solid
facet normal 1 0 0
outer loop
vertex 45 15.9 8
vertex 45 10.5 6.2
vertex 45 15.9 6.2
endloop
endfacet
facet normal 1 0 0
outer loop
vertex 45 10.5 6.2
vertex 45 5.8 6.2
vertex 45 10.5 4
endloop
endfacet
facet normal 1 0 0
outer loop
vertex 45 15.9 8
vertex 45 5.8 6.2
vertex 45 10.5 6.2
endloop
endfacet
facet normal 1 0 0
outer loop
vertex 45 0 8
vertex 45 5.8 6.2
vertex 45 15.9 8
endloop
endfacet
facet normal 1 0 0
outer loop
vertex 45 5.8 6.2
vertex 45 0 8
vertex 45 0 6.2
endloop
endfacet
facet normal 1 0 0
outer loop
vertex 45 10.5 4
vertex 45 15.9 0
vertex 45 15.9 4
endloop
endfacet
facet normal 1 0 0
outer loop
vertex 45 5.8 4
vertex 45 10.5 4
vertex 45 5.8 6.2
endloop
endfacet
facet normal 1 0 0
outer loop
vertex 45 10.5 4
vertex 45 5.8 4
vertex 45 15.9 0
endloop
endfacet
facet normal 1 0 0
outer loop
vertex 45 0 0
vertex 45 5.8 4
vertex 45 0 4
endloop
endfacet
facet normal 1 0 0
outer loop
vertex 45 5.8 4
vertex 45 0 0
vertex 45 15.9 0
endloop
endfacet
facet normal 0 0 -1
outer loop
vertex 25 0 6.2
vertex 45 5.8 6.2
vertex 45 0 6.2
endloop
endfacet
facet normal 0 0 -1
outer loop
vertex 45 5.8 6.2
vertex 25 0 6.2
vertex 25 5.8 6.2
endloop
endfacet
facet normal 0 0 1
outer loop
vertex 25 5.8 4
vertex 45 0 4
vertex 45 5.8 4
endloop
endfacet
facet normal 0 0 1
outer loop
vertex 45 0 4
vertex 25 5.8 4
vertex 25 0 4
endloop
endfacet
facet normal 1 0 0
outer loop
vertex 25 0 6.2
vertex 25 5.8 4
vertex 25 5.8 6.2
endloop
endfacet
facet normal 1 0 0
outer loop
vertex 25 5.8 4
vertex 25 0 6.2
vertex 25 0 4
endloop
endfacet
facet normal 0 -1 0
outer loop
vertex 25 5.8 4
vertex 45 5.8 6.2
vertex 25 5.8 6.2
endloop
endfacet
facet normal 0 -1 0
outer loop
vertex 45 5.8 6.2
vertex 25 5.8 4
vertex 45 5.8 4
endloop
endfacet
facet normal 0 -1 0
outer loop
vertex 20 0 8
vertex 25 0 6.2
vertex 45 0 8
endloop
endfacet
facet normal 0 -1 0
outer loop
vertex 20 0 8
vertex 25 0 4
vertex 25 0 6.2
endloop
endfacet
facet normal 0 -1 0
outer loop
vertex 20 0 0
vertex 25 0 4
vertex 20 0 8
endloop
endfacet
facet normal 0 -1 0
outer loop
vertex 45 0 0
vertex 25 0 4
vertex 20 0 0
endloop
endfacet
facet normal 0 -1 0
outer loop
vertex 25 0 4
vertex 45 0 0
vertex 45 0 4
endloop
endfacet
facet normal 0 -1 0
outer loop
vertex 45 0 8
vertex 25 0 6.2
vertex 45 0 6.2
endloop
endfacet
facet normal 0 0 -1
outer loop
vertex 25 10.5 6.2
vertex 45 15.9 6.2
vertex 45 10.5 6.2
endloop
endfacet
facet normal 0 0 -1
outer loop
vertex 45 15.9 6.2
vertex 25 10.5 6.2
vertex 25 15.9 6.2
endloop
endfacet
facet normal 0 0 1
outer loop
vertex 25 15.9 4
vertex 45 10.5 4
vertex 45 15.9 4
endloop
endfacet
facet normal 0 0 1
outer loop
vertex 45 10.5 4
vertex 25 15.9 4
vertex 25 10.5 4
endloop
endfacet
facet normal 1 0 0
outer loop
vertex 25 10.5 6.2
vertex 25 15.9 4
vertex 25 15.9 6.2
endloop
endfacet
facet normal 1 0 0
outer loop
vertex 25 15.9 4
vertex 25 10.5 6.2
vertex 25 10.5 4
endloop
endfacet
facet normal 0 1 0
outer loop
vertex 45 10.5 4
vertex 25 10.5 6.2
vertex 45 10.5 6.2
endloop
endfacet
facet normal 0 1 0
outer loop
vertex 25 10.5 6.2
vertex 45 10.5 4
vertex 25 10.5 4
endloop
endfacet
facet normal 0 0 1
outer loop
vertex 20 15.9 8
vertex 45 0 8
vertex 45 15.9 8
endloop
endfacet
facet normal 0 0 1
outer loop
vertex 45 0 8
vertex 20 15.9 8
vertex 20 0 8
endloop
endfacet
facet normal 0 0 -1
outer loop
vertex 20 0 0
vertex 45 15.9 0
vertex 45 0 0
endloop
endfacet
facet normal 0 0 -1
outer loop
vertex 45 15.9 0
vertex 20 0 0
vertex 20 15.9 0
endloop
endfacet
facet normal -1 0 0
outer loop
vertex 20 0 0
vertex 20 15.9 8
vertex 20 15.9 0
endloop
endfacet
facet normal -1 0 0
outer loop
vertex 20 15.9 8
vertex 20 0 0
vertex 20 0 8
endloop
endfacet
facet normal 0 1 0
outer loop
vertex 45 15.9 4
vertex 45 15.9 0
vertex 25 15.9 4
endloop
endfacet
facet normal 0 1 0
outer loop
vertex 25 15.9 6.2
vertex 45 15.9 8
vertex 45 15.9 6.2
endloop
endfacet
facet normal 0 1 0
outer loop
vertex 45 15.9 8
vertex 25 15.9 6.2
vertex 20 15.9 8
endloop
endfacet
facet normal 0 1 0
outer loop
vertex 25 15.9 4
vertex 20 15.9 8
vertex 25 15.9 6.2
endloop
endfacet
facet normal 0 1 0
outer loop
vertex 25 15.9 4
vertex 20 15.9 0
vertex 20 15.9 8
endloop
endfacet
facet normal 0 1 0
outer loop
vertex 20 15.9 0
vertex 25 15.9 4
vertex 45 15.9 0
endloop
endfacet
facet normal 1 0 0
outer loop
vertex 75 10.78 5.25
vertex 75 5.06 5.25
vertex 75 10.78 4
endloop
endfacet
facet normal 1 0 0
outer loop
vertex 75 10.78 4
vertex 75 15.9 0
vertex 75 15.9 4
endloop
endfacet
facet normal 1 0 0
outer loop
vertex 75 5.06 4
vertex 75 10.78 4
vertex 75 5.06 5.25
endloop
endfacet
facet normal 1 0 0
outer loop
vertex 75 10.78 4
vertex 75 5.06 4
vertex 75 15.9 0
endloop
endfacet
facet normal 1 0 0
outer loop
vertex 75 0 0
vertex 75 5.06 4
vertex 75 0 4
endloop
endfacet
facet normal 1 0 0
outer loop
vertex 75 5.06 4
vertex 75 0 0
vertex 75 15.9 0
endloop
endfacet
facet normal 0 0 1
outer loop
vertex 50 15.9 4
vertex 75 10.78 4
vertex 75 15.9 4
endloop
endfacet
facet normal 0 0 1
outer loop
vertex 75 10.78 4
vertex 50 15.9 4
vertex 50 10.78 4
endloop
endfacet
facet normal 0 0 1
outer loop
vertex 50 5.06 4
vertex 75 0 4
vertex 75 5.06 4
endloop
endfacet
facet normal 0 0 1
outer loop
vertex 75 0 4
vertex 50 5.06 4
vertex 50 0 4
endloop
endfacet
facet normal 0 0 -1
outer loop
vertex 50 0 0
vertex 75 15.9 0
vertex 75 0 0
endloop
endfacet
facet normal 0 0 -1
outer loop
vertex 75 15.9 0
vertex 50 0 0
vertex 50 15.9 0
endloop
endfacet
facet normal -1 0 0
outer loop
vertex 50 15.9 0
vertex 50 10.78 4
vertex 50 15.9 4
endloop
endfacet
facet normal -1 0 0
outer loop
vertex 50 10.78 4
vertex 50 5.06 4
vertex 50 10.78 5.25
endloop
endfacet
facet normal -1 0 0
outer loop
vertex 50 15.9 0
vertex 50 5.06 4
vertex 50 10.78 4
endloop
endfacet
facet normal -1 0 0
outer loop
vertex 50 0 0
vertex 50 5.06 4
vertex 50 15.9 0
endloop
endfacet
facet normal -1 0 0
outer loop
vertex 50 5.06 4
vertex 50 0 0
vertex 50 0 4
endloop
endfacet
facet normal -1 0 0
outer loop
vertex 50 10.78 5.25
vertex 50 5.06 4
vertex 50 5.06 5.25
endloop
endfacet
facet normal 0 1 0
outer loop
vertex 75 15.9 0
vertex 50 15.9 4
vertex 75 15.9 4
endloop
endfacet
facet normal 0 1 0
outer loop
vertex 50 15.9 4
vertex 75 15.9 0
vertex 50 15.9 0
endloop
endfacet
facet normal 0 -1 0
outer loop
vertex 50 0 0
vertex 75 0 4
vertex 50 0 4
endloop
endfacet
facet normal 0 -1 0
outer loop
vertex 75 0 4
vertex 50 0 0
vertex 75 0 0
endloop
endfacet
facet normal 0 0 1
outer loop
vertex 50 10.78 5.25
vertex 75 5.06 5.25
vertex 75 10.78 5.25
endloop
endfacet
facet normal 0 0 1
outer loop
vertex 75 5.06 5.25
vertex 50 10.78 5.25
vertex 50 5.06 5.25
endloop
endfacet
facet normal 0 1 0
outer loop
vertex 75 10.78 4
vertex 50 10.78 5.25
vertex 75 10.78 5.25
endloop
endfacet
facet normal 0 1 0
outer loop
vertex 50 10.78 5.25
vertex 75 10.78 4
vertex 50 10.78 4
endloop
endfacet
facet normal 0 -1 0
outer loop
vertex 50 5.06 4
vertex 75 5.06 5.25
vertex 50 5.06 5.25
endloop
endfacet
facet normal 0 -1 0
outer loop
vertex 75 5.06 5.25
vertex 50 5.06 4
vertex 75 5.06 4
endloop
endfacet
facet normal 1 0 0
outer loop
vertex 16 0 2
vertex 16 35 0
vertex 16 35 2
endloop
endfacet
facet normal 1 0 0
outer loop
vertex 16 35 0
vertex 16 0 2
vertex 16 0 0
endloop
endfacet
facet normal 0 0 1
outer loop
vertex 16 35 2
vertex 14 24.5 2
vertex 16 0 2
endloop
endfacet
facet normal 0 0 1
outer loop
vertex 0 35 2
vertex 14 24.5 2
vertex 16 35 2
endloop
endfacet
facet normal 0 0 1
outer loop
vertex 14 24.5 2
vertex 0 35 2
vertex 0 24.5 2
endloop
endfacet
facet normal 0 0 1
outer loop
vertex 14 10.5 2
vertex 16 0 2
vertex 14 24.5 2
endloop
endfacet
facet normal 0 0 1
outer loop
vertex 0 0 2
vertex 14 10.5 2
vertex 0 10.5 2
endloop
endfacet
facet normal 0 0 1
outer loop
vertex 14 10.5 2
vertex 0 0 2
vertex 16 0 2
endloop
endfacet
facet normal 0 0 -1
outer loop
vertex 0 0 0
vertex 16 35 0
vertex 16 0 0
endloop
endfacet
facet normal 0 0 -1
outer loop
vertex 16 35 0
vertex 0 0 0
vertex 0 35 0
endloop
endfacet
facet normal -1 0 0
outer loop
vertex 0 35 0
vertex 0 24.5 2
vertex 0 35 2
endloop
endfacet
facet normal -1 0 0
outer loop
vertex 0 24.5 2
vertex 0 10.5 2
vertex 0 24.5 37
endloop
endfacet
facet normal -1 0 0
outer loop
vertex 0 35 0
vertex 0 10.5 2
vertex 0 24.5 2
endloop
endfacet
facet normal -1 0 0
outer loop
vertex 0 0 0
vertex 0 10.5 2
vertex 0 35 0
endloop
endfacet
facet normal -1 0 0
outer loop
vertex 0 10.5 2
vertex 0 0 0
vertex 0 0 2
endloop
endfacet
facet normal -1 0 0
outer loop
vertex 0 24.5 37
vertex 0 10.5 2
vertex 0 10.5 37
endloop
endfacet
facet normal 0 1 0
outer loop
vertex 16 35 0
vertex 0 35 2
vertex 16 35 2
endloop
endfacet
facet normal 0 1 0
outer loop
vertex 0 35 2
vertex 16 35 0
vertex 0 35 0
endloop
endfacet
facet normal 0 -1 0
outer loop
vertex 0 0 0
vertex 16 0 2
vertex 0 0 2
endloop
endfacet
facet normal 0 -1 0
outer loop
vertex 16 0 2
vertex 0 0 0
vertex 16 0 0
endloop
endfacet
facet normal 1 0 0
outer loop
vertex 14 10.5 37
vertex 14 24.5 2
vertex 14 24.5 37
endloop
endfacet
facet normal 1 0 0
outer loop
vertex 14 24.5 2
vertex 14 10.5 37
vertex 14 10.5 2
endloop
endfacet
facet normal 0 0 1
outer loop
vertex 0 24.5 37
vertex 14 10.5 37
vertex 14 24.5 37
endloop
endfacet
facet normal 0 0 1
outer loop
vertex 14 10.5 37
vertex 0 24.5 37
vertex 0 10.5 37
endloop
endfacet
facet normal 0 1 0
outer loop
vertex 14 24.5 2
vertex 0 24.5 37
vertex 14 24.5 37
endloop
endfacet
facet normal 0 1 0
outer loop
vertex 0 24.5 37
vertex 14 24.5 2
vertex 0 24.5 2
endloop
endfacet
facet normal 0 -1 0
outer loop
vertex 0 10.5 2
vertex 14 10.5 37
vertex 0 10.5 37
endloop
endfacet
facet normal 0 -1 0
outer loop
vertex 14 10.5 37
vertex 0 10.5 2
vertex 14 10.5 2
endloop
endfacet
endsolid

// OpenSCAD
// base
cube([16, 35, 2]);
// tower
translate([0, 10.5, 2]) {
    cube([14, 14, 35]);
}
// mount
translate([20, 0, 0]) {
// subtract side area left
    difference() {
        // mount cube
        cube([25, 15.9, 8]);
        
        // 5.5 10 2
        translate([5, 0, 4]) {
            cube([20, 5.8, 2.2]);
            translate([0, 10.5, 0]) {
                cube([20, 5.8, 2.2]);
            }
        }
    }
}

translate([50, 0, 0]) {
    // bottom cube
    cube([25, 15.9, 4]);
    
    // middle
    translate ([0, 5.06, 4]) {
        cube([25, 5.72, 1.25]);
    }

    // top
    //cube([]);
}
